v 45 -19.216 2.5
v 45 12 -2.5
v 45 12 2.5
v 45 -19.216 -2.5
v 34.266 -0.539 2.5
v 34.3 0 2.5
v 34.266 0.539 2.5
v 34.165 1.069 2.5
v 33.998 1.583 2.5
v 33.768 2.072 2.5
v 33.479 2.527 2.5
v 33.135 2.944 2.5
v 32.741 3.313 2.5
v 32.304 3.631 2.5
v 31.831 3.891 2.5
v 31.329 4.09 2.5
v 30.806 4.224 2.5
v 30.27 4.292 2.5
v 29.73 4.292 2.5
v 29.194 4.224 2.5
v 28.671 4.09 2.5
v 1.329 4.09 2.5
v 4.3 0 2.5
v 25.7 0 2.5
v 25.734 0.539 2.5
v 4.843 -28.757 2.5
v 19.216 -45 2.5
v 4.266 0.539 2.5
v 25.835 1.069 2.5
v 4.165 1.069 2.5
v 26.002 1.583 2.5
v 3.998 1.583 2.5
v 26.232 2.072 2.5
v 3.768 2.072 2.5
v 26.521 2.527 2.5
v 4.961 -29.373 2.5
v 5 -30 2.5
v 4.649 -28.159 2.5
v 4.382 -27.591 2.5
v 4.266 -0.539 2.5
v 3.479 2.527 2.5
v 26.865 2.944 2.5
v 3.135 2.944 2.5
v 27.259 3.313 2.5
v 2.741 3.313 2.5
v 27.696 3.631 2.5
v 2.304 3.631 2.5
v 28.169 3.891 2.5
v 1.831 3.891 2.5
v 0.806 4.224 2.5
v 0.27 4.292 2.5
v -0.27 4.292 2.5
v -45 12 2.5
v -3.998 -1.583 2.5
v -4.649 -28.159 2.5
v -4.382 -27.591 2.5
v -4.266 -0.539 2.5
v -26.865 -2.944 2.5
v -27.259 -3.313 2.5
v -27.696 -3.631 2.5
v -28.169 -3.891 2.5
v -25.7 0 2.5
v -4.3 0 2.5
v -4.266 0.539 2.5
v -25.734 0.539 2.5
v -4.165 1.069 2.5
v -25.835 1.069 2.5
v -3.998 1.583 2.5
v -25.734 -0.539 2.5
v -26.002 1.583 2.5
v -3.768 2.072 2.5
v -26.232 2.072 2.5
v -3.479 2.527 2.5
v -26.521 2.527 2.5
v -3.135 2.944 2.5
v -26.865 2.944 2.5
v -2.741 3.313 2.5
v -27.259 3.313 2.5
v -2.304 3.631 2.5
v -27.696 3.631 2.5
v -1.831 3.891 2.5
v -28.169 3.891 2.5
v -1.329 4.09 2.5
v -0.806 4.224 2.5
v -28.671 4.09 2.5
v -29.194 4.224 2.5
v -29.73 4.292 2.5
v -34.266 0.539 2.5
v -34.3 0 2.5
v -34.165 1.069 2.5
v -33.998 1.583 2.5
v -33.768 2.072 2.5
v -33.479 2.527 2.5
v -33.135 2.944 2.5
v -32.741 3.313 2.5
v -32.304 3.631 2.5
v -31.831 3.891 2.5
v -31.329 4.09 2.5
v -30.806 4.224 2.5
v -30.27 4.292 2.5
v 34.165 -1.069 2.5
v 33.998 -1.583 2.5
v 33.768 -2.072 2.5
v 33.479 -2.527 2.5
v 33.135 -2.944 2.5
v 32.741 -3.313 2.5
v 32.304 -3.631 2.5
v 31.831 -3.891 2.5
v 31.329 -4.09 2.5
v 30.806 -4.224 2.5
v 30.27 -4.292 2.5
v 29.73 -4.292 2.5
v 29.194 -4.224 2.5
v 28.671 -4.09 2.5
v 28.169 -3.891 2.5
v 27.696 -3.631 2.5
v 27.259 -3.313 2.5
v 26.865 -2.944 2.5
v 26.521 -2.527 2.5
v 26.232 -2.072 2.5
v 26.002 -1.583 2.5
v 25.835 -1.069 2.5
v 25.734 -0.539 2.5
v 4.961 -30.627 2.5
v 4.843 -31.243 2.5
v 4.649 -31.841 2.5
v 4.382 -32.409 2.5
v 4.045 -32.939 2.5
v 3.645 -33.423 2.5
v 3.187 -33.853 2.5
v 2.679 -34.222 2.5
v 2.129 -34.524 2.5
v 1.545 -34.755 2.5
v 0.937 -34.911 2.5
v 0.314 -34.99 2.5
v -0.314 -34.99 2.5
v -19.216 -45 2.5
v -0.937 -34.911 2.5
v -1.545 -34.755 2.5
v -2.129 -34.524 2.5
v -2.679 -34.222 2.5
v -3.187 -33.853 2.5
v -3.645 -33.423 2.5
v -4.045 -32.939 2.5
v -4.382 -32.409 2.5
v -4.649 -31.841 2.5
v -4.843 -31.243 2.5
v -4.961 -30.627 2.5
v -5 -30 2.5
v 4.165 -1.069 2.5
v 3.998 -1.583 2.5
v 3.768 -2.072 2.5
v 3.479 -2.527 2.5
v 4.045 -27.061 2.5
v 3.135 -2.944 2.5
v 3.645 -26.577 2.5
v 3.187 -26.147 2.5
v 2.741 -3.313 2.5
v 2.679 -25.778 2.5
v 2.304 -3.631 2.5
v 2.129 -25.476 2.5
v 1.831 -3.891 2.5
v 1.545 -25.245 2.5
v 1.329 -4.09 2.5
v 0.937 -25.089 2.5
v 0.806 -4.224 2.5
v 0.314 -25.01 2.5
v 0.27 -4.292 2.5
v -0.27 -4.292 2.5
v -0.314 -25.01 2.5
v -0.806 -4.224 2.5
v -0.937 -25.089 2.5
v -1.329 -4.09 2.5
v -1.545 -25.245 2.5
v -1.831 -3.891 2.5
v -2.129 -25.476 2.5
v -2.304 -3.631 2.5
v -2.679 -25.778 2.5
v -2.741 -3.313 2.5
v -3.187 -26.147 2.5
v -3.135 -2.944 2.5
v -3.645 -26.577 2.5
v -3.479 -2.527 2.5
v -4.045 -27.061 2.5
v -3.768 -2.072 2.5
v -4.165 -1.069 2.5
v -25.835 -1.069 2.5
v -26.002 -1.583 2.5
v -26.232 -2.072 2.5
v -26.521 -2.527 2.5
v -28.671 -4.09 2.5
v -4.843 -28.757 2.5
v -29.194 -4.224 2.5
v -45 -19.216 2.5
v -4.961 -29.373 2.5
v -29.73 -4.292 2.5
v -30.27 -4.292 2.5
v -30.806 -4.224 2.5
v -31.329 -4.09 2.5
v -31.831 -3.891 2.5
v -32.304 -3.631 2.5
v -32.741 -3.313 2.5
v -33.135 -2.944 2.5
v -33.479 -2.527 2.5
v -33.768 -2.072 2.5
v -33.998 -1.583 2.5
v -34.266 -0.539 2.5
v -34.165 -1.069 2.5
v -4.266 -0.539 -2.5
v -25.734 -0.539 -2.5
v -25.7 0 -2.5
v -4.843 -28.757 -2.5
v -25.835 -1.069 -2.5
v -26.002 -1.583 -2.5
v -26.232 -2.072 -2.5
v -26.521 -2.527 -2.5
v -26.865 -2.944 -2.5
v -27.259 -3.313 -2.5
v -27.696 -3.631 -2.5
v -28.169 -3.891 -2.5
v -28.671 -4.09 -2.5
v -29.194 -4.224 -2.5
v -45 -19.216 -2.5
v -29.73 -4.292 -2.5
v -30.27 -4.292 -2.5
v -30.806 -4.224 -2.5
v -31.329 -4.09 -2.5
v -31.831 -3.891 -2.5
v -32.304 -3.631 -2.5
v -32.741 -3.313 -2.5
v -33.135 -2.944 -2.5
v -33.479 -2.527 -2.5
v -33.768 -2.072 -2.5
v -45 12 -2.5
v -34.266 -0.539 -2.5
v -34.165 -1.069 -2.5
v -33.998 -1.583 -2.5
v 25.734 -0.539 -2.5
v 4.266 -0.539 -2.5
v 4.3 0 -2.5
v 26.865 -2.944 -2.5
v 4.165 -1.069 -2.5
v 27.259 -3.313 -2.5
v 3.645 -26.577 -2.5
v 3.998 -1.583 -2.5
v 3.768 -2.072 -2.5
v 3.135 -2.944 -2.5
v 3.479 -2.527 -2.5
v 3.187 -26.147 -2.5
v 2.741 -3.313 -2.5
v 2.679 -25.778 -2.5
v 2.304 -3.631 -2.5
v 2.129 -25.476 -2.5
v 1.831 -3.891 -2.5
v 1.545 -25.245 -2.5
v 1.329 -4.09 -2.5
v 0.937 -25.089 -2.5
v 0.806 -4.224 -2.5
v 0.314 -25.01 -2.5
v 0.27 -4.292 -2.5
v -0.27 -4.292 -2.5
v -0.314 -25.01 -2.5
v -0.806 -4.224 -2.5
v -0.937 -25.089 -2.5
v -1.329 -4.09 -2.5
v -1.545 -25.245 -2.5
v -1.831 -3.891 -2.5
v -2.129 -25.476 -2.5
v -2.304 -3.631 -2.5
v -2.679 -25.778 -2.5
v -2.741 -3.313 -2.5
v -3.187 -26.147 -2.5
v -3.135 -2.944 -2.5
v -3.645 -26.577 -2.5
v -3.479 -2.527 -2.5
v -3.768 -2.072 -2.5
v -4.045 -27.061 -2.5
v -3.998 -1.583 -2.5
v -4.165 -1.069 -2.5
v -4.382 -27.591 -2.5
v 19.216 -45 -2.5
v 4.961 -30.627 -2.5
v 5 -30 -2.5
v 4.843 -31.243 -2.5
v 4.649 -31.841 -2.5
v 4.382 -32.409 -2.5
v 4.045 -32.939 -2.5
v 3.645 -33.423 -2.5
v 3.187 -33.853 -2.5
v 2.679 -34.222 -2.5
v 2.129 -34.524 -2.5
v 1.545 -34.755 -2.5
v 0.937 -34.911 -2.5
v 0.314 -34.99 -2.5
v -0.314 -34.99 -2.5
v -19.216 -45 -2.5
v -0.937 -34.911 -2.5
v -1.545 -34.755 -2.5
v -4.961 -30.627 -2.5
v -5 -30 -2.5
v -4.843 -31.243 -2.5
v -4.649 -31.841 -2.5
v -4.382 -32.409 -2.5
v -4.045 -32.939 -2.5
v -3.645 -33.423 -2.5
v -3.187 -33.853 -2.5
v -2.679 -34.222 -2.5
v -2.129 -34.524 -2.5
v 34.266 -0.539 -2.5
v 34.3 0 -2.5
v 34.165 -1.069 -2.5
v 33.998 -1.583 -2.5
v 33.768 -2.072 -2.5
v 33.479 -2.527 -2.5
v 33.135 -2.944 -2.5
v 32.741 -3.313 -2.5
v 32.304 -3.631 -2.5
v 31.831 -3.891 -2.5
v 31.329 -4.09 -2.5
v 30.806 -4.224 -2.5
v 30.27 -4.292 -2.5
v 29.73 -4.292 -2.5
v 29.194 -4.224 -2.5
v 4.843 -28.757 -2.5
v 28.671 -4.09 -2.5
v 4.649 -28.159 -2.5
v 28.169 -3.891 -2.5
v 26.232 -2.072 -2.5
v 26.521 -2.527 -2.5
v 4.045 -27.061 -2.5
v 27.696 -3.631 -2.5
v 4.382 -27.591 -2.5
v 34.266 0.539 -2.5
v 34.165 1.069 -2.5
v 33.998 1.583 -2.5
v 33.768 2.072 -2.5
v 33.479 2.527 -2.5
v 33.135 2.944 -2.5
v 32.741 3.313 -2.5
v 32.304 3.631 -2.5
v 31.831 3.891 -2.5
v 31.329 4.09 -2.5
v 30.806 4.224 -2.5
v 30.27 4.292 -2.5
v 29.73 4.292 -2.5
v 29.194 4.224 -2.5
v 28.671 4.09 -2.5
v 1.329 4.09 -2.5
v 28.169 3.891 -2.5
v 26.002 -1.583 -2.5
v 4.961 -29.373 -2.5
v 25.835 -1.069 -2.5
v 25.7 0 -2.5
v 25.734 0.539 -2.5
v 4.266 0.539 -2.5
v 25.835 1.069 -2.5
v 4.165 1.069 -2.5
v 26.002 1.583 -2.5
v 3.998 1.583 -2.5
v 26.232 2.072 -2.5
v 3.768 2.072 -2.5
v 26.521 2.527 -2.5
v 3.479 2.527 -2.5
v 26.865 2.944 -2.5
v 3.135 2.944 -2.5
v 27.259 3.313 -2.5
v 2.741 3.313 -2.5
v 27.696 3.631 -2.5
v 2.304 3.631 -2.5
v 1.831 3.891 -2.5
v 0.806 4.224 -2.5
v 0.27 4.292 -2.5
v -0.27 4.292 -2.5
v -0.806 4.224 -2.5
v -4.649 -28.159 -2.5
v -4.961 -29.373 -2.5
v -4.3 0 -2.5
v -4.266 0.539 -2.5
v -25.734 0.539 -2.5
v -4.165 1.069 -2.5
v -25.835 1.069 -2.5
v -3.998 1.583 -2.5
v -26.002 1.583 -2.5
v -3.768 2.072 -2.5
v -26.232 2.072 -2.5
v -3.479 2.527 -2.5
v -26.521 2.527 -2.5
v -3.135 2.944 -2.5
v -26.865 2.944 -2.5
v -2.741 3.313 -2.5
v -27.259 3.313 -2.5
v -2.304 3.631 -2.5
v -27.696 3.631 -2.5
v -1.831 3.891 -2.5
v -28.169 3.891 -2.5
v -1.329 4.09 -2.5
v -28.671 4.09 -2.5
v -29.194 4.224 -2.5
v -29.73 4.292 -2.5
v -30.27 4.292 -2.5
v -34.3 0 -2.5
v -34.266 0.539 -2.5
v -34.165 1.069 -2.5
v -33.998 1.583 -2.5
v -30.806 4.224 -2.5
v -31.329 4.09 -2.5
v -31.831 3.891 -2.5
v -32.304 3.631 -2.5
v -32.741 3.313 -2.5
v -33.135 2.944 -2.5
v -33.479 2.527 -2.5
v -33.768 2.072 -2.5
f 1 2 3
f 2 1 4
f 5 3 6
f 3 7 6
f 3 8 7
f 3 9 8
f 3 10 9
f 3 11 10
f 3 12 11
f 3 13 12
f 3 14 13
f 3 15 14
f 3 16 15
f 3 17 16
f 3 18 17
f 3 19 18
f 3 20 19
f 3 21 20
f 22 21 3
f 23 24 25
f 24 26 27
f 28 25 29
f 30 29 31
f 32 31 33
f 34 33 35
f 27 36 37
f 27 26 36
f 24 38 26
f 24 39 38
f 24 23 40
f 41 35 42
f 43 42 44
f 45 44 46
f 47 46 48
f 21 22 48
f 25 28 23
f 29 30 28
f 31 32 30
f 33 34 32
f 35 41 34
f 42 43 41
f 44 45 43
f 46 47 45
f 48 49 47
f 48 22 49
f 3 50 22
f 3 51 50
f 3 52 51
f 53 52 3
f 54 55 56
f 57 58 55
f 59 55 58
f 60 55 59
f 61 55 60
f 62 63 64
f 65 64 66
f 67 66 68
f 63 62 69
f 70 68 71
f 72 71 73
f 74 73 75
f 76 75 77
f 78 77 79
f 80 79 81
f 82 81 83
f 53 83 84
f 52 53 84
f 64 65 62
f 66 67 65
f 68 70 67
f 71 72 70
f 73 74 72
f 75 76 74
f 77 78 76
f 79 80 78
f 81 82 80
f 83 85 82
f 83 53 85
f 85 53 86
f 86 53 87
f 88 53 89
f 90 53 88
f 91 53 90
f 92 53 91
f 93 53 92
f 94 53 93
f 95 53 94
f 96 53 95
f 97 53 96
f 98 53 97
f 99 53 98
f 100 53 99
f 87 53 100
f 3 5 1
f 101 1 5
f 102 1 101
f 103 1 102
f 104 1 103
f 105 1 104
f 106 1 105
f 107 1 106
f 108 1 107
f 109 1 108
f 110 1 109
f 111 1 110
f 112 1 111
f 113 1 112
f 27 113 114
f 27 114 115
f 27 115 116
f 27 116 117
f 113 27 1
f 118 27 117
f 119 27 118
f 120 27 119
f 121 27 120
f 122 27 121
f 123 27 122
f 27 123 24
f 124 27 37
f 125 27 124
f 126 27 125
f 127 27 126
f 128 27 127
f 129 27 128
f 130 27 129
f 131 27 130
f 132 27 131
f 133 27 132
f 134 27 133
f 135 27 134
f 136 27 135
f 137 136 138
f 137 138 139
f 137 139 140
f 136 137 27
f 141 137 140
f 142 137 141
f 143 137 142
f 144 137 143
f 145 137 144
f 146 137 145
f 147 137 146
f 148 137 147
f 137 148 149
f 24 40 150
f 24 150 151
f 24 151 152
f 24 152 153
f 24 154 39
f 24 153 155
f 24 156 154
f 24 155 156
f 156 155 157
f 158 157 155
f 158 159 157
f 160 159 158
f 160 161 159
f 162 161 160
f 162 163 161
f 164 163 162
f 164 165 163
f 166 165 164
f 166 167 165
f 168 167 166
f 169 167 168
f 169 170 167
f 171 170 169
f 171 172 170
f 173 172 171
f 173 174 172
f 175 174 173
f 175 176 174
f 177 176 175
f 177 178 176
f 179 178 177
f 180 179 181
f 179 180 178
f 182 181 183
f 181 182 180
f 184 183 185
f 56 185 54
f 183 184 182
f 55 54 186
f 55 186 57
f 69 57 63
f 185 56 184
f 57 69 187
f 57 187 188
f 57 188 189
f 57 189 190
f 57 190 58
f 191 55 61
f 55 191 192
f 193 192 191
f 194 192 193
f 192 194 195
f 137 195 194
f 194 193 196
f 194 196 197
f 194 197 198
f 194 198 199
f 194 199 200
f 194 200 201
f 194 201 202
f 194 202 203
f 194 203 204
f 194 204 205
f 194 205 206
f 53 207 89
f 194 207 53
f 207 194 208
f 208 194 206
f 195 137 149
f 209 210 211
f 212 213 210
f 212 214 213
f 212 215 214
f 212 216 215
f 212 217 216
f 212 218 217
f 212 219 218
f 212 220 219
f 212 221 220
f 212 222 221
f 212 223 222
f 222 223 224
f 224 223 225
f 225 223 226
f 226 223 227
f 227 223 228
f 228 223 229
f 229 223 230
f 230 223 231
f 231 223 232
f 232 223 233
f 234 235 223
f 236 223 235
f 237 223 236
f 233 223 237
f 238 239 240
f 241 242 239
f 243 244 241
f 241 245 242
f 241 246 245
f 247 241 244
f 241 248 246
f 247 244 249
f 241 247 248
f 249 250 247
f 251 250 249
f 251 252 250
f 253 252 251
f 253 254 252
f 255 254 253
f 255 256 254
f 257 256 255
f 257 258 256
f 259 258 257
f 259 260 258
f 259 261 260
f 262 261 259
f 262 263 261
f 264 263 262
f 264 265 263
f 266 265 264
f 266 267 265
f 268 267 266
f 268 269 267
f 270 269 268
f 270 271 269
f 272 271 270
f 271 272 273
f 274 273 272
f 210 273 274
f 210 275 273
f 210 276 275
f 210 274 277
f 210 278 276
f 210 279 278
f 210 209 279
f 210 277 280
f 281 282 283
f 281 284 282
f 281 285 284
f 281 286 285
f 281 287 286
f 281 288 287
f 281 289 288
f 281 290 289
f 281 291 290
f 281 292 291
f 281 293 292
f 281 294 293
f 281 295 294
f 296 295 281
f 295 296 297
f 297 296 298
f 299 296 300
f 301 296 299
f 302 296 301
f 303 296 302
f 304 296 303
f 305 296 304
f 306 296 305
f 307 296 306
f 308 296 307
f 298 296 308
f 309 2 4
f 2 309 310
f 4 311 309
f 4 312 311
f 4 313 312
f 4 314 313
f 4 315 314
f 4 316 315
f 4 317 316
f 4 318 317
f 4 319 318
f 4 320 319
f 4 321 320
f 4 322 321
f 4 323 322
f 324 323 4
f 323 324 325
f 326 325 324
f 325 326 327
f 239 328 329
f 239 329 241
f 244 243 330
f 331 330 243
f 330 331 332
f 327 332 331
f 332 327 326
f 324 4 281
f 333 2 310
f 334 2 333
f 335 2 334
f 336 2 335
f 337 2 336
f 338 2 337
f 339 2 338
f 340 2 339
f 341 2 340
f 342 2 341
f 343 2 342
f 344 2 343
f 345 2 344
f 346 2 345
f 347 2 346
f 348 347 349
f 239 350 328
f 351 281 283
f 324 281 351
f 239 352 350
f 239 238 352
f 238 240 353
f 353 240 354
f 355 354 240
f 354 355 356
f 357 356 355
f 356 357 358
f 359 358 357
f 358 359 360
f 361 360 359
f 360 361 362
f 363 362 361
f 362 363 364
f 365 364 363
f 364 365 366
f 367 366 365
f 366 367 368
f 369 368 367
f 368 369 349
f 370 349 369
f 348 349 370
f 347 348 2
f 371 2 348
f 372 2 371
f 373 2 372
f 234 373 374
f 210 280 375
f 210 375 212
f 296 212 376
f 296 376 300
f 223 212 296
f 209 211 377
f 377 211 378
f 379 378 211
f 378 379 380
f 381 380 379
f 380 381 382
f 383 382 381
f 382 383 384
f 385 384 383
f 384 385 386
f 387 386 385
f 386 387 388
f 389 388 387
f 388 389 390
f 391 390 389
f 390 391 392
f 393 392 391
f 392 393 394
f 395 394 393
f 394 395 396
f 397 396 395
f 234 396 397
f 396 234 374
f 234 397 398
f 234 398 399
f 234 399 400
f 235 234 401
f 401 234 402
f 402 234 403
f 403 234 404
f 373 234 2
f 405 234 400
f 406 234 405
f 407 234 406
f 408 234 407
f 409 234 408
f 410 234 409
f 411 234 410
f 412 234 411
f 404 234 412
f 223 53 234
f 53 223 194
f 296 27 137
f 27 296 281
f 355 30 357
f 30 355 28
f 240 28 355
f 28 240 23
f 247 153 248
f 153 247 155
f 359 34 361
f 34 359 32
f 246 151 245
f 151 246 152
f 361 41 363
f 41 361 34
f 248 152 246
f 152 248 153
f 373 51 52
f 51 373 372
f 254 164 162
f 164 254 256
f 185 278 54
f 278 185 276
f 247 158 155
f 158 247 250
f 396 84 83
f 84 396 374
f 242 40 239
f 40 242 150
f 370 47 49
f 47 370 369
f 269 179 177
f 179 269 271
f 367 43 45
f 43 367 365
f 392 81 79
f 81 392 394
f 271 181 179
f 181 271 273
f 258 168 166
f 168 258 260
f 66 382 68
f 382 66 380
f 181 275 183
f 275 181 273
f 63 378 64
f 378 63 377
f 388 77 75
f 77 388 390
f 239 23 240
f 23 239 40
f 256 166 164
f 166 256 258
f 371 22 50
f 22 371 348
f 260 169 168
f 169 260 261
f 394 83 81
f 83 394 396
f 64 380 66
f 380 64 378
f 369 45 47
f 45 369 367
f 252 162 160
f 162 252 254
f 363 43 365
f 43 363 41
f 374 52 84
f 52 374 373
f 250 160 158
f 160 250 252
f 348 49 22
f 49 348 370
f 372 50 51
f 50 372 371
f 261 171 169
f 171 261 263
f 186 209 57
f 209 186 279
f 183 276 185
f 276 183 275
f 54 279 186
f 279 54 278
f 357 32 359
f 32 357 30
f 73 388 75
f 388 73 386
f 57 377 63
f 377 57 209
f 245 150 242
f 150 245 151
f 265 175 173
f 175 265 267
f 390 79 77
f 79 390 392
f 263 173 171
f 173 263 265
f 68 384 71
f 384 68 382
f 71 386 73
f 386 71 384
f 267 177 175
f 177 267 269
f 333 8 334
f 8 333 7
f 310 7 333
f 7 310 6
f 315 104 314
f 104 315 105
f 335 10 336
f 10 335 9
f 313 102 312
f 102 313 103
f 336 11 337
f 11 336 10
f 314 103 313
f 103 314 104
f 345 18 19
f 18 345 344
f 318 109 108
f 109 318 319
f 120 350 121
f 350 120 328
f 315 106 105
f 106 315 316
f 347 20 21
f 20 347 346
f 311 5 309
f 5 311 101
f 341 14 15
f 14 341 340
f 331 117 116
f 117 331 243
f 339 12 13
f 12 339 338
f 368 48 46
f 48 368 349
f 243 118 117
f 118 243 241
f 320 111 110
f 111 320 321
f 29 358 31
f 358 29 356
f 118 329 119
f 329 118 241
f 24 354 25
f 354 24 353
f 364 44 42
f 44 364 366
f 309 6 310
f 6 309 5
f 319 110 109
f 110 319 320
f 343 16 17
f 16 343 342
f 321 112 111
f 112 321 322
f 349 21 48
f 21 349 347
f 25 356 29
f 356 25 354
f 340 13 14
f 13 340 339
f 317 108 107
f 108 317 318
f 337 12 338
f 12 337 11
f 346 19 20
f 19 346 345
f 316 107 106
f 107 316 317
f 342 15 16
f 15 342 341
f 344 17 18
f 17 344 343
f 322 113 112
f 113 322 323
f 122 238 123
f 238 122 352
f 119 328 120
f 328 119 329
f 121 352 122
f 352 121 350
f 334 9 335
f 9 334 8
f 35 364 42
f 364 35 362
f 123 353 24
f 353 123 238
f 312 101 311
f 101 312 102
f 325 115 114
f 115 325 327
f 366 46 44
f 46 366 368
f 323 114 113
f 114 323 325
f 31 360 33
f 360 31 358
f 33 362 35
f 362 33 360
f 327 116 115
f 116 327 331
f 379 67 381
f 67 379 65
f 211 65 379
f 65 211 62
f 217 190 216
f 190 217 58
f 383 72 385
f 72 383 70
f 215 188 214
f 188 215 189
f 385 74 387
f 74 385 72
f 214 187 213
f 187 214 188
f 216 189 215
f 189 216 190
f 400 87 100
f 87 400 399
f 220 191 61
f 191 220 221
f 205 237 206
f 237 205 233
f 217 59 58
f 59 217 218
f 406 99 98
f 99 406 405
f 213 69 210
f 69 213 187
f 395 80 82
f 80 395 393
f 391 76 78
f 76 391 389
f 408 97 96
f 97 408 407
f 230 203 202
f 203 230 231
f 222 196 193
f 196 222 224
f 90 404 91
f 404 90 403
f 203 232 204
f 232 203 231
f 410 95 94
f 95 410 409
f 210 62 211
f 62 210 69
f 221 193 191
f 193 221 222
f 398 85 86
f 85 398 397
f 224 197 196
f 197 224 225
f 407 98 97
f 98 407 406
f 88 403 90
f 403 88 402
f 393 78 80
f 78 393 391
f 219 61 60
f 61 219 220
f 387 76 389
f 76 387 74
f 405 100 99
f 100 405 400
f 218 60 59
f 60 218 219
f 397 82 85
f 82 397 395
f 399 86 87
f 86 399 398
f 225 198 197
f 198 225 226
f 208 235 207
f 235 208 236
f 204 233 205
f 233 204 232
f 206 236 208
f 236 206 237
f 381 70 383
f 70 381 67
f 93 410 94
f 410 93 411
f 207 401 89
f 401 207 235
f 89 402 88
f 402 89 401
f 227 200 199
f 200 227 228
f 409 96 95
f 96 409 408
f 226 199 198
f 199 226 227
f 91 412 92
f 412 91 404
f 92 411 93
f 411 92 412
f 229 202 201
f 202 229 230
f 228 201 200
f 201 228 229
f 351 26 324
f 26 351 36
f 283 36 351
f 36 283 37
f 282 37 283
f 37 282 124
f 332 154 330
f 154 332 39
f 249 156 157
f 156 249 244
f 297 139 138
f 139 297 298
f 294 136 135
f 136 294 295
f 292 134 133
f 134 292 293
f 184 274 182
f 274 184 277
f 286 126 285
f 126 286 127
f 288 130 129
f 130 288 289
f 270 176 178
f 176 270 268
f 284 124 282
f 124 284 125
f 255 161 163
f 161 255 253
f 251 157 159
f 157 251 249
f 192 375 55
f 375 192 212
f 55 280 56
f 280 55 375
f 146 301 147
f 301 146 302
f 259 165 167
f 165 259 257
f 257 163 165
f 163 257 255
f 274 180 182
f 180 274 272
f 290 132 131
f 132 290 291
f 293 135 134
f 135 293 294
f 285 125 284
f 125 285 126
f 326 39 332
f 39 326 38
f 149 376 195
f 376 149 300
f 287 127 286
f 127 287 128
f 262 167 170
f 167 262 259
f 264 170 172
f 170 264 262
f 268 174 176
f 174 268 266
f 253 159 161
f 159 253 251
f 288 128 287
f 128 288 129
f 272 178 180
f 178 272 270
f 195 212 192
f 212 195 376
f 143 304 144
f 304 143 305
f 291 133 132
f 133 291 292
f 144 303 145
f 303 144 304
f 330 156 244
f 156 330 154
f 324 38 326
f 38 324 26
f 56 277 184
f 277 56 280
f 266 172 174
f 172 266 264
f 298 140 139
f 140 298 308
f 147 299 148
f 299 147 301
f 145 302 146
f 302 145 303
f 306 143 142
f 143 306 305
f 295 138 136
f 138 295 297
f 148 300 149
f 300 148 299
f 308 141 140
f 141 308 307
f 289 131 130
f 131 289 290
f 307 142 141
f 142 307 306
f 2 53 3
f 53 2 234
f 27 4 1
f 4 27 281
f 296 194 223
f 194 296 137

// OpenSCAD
r_axis=4.3;
r_syringe=5;
thickness=5;
cut=thickness+20;
difference()
{
cube([90,90,thickness],center=true);
cylinder(h=cut,r=r_axis, center=true, $fn=50);
    
translate([30,0,0])cylinder(h=cut,r=r_axis, center=true, $fn=50);
translate([-30,0,0])cylinder(h=cut,r=r_axis, center=true, $fn=50);
//foro siringa
translate([0,-30,0])cylinder(h=cut,r=r_syringe, center=true, $fn=50); 
translate([0,52,0]) cube([130,80,cut],center=true);
  translate([45,-47.5,0]) rotate([0,0,45]) cube([40,40,cut],center=true);
translate([-45,-47.5,0]) rotate([0,0,45]) cube([40,40,cut],center=true);
}
